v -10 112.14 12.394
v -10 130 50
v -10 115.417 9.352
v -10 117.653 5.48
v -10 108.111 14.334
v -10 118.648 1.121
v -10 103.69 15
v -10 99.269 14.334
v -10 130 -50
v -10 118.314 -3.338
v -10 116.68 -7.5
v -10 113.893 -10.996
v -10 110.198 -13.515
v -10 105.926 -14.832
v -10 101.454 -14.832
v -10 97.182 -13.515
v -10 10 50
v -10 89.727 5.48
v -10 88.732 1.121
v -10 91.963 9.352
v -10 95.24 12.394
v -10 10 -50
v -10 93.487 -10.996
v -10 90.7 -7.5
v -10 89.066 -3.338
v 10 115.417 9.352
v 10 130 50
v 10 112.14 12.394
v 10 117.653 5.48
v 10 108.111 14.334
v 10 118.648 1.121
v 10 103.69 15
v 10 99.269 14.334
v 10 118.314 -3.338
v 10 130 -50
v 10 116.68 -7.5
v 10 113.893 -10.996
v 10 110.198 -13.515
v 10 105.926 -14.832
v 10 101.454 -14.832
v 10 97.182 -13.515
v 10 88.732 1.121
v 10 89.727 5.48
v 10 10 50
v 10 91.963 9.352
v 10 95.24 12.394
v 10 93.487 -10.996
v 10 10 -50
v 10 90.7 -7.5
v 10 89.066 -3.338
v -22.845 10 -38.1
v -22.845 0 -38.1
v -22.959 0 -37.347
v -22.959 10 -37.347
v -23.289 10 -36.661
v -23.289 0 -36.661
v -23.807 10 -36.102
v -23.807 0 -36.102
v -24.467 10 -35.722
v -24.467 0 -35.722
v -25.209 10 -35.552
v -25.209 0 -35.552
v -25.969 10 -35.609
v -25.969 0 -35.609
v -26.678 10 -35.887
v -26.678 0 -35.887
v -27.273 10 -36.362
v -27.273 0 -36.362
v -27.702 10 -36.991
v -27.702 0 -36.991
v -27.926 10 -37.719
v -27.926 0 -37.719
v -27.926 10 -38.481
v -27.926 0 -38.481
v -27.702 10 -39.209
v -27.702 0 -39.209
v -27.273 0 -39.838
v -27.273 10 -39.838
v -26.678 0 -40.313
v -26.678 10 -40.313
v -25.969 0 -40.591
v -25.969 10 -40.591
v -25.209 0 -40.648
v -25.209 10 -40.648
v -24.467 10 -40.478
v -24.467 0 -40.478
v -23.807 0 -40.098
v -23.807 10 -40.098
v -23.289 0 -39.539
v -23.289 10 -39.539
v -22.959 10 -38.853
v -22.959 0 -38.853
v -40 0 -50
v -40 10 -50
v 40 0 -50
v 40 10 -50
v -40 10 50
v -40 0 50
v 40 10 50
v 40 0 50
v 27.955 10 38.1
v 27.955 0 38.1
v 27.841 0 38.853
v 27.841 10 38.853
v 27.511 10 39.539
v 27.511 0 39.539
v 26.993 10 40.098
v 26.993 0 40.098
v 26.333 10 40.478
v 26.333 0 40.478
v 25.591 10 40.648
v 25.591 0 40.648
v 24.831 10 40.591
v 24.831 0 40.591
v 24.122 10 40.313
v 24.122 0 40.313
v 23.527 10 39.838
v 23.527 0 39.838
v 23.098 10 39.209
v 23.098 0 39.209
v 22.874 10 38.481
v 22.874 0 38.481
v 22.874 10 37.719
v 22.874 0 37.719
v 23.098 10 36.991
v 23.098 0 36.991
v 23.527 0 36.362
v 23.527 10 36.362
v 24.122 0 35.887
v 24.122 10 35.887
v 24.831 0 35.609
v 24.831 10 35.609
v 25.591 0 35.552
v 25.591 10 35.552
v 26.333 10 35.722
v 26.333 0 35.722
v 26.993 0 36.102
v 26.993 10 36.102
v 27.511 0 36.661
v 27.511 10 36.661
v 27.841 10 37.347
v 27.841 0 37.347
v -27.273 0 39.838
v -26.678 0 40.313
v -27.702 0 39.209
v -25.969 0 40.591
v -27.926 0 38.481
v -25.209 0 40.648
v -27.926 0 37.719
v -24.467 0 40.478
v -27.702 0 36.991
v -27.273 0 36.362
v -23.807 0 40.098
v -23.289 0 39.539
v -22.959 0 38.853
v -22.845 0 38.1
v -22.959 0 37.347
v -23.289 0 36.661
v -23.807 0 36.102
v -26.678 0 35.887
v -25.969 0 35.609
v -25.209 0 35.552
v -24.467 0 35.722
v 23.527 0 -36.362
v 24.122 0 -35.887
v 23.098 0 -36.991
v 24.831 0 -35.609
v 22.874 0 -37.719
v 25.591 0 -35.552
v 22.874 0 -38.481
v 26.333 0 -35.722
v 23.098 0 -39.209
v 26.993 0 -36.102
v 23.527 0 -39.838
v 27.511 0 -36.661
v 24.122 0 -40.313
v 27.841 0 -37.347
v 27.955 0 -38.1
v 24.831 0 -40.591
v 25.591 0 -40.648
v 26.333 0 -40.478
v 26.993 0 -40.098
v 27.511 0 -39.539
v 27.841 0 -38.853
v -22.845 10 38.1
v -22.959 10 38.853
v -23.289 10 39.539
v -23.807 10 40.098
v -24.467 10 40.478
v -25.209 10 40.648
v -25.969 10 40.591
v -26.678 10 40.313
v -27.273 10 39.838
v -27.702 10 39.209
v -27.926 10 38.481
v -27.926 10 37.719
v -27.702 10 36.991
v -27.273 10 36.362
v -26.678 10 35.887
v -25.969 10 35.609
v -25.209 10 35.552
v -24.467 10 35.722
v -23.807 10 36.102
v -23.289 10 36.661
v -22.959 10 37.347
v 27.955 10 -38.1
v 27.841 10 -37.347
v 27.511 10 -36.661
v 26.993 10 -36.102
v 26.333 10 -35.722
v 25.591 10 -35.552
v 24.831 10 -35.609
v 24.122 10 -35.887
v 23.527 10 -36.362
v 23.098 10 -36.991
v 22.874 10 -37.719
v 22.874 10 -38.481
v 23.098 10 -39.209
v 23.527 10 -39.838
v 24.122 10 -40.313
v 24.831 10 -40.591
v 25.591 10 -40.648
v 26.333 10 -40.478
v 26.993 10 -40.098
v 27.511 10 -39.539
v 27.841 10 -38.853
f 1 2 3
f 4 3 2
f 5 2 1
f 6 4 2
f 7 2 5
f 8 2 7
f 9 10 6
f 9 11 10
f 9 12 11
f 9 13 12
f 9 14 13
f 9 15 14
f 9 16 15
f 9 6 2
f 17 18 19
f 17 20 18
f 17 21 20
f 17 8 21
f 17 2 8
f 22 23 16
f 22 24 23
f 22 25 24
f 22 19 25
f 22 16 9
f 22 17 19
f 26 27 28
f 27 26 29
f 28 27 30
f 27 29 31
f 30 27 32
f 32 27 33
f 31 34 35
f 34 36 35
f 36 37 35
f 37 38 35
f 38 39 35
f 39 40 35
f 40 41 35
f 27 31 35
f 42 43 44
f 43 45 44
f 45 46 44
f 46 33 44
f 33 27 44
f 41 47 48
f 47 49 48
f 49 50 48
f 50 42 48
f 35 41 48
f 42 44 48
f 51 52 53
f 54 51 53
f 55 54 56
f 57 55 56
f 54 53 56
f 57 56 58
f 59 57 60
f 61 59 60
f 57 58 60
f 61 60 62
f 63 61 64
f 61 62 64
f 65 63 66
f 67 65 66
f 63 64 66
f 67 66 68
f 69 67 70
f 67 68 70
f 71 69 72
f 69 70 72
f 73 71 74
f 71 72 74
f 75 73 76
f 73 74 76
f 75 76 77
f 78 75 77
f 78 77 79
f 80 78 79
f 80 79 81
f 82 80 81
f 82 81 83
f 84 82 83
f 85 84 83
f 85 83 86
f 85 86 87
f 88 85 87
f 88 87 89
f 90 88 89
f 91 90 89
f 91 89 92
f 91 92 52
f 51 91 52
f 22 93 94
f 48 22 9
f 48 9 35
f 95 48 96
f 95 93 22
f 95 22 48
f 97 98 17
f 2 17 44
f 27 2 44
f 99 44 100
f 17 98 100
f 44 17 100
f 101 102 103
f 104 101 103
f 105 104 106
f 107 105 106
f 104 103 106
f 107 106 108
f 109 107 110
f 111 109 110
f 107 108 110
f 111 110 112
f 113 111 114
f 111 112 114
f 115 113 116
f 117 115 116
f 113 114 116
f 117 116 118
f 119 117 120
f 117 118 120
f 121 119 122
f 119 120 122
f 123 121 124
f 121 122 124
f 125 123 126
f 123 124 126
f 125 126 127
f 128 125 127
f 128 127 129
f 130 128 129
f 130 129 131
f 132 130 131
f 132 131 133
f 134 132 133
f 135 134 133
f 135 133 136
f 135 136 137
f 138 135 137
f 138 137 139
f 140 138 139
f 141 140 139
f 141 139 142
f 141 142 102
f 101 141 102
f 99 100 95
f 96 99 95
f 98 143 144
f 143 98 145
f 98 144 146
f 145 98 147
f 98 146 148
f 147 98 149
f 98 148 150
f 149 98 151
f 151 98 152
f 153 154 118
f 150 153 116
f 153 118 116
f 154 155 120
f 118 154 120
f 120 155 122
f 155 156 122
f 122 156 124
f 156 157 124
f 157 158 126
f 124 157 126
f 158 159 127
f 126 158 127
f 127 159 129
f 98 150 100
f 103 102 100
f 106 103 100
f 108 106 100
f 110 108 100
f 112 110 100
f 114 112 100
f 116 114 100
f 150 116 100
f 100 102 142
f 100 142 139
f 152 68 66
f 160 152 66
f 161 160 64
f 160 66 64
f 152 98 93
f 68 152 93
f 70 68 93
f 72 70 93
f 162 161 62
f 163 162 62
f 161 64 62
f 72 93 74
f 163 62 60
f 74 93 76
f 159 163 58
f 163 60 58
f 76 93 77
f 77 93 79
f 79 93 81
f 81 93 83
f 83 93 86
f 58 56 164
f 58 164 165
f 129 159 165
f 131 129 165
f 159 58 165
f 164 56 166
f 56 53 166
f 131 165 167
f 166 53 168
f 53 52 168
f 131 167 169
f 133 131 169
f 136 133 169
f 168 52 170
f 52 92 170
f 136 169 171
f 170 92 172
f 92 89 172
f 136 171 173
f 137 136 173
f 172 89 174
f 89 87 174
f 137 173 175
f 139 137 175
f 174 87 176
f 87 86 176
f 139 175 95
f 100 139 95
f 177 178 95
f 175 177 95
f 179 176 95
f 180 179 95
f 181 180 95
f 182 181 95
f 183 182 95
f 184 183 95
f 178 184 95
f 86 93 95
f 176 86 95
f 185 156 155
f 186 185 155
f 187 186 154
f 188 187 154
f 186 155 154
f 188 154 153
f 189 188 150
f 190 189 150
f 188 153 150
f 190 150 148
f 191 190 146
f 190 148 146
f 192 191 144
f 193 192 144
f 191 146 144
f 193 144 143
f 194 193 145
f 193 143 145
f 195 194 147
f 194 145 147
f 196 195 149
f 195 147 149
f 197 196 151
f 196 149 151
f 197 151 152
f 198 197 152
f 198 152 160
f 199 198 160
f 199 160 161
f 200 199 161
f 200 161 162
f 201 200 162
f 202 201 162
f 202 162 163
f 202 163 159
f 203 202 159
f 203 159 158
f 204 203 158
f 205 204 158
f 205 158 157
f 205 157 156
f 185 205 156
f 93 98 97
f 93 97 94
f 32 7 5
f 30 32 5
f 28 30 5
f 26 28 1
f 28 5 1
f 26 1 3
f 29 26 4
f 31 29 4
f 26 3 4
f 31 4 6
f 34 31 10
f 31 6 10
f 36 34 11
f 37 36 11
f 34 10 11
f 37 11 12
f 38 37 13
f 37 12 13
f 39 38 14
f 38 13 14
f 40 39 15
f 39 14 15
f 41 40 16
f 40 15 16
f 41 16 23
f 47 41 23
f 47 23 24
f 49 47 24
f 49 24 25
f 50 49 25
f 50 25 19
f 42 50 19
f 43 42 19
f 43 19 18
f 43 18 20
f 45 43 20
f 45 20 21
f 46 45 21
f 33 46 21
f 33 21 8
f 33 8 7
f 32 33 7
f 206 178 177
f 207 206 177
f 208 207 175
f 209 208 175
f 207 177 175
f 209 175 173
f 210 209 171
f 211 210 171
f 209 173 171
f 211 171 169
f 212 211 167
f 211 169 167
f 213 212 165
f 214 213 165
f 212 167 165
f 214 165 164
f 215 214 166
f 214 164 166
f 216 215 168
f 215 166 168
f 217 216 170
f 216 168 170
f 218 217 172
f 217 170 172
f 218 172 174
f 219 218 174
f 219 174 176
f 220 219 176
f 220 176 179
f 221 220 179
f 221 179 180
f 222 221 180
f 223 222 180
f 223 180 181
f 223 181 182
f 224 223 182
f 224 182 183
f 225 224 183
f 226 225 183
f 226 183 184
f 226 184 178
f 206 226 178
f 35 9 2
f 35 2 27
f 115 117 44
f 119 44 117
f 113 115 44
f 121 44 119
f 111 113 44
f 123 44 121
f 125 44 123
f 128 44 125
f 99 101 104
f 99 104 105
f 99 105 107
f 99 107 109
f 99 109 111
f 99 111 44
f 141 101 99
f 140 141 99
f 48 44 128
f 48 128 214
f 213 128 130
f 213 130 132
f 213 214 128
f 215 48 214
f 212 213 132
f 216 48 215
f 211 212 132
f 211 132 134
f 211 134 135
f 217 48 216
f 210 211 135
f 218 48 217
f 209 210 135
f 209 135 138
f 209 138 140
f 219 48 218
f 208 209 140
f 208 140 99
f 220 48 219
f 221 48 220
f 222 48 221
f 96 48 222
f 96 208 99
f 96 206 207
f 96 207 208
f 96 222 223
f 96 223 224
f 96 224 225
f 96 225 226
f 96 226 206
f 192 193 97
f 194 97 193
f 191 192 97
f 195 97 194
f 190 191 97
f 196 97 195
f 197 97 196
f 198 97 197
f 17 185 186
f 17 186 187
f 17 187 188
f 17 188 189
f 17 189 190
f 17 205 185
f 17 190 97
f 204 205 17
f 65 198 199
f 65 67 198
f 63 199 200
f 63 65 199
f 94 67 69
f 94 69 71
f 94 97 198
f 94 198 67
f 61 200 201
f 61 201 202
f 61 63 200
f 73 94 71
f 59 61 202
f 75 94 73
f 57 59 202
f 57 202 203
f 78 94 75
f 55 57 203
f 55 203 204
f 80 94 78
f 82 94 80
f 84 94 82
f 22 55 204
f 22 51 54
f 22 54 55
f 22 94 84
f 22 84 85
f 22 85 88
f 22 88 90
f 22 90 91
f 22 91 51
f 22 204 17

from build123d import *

# Parameters (mm, degrees)
SKETCH2_W           = 80
SKETCH2_H           = 100
BOSS_EXTRUDE1_DEPTH = 10
SKETCH3_W           = 20
SKETCH3_H           = 100
BOSS_EXTRUDE2_DEPTH = 120
SKETCH5_R           = 2.555
CUT_EXTRUDE2_DEPTH  = 55
SKETCH4_R           = 15
CUT_EXTRUDE3_DEPTH  = 29


with BuildPart() as part:
    # Sketch2 → Boss-Extrude1 (new body)
    with BuildSketch(Plane(origin=(0, 0, 0), x_dir=(1, 0, 0), z_dir=(0, 1, 0))):
        Rectangle(SKETCH2_W, SKETCH2_H)
    extrude(amount=BOSS_EXTRUDE1_DEPTH)

    # Sketch3 → Boss-Extrude2 (add)
    with BuildSketch(Plane(origin=(0, 10, 0), x_dir=(1, 0, 0), z_dir=(0, 1, 0))):
        Rectangle(SKETCH3_W, SKETCH3_H)
    extrude(amount=BOSS_EXTRUDE2_DEPTH)

    # Sketch5 → Cut-Extrude2 (cut)
    with BuildSketch(Plane.XZ):
        with Locations((-25.4, -38.1)):
            Circle(SKETCH5_R)
        with Locations((25.4, -38.1)):
            Circle(SKETCH5_R)
        with Locations((-25.4, 38.1)):
            Circle(SKETCH5_R)
        with Locations((25.4, 38.1)):
            Circle(SKETCH5_R)
    extrude(amount=-CUT_EXTRUDE2_DEPTH, mode=Mode.SUBTRACT)

    # Sketch4 → Cut-Extrude3 (cut)
    with BuildSketch(Plane.ZY.offset(10)):
        with Locations((0, 103.69)):
            Circle(SKETCH4_R)
    extrude(amount=-CUT_EXTRUDE3_DEPTH, mode=Mode.SUBTRACT)


solid = part.part
